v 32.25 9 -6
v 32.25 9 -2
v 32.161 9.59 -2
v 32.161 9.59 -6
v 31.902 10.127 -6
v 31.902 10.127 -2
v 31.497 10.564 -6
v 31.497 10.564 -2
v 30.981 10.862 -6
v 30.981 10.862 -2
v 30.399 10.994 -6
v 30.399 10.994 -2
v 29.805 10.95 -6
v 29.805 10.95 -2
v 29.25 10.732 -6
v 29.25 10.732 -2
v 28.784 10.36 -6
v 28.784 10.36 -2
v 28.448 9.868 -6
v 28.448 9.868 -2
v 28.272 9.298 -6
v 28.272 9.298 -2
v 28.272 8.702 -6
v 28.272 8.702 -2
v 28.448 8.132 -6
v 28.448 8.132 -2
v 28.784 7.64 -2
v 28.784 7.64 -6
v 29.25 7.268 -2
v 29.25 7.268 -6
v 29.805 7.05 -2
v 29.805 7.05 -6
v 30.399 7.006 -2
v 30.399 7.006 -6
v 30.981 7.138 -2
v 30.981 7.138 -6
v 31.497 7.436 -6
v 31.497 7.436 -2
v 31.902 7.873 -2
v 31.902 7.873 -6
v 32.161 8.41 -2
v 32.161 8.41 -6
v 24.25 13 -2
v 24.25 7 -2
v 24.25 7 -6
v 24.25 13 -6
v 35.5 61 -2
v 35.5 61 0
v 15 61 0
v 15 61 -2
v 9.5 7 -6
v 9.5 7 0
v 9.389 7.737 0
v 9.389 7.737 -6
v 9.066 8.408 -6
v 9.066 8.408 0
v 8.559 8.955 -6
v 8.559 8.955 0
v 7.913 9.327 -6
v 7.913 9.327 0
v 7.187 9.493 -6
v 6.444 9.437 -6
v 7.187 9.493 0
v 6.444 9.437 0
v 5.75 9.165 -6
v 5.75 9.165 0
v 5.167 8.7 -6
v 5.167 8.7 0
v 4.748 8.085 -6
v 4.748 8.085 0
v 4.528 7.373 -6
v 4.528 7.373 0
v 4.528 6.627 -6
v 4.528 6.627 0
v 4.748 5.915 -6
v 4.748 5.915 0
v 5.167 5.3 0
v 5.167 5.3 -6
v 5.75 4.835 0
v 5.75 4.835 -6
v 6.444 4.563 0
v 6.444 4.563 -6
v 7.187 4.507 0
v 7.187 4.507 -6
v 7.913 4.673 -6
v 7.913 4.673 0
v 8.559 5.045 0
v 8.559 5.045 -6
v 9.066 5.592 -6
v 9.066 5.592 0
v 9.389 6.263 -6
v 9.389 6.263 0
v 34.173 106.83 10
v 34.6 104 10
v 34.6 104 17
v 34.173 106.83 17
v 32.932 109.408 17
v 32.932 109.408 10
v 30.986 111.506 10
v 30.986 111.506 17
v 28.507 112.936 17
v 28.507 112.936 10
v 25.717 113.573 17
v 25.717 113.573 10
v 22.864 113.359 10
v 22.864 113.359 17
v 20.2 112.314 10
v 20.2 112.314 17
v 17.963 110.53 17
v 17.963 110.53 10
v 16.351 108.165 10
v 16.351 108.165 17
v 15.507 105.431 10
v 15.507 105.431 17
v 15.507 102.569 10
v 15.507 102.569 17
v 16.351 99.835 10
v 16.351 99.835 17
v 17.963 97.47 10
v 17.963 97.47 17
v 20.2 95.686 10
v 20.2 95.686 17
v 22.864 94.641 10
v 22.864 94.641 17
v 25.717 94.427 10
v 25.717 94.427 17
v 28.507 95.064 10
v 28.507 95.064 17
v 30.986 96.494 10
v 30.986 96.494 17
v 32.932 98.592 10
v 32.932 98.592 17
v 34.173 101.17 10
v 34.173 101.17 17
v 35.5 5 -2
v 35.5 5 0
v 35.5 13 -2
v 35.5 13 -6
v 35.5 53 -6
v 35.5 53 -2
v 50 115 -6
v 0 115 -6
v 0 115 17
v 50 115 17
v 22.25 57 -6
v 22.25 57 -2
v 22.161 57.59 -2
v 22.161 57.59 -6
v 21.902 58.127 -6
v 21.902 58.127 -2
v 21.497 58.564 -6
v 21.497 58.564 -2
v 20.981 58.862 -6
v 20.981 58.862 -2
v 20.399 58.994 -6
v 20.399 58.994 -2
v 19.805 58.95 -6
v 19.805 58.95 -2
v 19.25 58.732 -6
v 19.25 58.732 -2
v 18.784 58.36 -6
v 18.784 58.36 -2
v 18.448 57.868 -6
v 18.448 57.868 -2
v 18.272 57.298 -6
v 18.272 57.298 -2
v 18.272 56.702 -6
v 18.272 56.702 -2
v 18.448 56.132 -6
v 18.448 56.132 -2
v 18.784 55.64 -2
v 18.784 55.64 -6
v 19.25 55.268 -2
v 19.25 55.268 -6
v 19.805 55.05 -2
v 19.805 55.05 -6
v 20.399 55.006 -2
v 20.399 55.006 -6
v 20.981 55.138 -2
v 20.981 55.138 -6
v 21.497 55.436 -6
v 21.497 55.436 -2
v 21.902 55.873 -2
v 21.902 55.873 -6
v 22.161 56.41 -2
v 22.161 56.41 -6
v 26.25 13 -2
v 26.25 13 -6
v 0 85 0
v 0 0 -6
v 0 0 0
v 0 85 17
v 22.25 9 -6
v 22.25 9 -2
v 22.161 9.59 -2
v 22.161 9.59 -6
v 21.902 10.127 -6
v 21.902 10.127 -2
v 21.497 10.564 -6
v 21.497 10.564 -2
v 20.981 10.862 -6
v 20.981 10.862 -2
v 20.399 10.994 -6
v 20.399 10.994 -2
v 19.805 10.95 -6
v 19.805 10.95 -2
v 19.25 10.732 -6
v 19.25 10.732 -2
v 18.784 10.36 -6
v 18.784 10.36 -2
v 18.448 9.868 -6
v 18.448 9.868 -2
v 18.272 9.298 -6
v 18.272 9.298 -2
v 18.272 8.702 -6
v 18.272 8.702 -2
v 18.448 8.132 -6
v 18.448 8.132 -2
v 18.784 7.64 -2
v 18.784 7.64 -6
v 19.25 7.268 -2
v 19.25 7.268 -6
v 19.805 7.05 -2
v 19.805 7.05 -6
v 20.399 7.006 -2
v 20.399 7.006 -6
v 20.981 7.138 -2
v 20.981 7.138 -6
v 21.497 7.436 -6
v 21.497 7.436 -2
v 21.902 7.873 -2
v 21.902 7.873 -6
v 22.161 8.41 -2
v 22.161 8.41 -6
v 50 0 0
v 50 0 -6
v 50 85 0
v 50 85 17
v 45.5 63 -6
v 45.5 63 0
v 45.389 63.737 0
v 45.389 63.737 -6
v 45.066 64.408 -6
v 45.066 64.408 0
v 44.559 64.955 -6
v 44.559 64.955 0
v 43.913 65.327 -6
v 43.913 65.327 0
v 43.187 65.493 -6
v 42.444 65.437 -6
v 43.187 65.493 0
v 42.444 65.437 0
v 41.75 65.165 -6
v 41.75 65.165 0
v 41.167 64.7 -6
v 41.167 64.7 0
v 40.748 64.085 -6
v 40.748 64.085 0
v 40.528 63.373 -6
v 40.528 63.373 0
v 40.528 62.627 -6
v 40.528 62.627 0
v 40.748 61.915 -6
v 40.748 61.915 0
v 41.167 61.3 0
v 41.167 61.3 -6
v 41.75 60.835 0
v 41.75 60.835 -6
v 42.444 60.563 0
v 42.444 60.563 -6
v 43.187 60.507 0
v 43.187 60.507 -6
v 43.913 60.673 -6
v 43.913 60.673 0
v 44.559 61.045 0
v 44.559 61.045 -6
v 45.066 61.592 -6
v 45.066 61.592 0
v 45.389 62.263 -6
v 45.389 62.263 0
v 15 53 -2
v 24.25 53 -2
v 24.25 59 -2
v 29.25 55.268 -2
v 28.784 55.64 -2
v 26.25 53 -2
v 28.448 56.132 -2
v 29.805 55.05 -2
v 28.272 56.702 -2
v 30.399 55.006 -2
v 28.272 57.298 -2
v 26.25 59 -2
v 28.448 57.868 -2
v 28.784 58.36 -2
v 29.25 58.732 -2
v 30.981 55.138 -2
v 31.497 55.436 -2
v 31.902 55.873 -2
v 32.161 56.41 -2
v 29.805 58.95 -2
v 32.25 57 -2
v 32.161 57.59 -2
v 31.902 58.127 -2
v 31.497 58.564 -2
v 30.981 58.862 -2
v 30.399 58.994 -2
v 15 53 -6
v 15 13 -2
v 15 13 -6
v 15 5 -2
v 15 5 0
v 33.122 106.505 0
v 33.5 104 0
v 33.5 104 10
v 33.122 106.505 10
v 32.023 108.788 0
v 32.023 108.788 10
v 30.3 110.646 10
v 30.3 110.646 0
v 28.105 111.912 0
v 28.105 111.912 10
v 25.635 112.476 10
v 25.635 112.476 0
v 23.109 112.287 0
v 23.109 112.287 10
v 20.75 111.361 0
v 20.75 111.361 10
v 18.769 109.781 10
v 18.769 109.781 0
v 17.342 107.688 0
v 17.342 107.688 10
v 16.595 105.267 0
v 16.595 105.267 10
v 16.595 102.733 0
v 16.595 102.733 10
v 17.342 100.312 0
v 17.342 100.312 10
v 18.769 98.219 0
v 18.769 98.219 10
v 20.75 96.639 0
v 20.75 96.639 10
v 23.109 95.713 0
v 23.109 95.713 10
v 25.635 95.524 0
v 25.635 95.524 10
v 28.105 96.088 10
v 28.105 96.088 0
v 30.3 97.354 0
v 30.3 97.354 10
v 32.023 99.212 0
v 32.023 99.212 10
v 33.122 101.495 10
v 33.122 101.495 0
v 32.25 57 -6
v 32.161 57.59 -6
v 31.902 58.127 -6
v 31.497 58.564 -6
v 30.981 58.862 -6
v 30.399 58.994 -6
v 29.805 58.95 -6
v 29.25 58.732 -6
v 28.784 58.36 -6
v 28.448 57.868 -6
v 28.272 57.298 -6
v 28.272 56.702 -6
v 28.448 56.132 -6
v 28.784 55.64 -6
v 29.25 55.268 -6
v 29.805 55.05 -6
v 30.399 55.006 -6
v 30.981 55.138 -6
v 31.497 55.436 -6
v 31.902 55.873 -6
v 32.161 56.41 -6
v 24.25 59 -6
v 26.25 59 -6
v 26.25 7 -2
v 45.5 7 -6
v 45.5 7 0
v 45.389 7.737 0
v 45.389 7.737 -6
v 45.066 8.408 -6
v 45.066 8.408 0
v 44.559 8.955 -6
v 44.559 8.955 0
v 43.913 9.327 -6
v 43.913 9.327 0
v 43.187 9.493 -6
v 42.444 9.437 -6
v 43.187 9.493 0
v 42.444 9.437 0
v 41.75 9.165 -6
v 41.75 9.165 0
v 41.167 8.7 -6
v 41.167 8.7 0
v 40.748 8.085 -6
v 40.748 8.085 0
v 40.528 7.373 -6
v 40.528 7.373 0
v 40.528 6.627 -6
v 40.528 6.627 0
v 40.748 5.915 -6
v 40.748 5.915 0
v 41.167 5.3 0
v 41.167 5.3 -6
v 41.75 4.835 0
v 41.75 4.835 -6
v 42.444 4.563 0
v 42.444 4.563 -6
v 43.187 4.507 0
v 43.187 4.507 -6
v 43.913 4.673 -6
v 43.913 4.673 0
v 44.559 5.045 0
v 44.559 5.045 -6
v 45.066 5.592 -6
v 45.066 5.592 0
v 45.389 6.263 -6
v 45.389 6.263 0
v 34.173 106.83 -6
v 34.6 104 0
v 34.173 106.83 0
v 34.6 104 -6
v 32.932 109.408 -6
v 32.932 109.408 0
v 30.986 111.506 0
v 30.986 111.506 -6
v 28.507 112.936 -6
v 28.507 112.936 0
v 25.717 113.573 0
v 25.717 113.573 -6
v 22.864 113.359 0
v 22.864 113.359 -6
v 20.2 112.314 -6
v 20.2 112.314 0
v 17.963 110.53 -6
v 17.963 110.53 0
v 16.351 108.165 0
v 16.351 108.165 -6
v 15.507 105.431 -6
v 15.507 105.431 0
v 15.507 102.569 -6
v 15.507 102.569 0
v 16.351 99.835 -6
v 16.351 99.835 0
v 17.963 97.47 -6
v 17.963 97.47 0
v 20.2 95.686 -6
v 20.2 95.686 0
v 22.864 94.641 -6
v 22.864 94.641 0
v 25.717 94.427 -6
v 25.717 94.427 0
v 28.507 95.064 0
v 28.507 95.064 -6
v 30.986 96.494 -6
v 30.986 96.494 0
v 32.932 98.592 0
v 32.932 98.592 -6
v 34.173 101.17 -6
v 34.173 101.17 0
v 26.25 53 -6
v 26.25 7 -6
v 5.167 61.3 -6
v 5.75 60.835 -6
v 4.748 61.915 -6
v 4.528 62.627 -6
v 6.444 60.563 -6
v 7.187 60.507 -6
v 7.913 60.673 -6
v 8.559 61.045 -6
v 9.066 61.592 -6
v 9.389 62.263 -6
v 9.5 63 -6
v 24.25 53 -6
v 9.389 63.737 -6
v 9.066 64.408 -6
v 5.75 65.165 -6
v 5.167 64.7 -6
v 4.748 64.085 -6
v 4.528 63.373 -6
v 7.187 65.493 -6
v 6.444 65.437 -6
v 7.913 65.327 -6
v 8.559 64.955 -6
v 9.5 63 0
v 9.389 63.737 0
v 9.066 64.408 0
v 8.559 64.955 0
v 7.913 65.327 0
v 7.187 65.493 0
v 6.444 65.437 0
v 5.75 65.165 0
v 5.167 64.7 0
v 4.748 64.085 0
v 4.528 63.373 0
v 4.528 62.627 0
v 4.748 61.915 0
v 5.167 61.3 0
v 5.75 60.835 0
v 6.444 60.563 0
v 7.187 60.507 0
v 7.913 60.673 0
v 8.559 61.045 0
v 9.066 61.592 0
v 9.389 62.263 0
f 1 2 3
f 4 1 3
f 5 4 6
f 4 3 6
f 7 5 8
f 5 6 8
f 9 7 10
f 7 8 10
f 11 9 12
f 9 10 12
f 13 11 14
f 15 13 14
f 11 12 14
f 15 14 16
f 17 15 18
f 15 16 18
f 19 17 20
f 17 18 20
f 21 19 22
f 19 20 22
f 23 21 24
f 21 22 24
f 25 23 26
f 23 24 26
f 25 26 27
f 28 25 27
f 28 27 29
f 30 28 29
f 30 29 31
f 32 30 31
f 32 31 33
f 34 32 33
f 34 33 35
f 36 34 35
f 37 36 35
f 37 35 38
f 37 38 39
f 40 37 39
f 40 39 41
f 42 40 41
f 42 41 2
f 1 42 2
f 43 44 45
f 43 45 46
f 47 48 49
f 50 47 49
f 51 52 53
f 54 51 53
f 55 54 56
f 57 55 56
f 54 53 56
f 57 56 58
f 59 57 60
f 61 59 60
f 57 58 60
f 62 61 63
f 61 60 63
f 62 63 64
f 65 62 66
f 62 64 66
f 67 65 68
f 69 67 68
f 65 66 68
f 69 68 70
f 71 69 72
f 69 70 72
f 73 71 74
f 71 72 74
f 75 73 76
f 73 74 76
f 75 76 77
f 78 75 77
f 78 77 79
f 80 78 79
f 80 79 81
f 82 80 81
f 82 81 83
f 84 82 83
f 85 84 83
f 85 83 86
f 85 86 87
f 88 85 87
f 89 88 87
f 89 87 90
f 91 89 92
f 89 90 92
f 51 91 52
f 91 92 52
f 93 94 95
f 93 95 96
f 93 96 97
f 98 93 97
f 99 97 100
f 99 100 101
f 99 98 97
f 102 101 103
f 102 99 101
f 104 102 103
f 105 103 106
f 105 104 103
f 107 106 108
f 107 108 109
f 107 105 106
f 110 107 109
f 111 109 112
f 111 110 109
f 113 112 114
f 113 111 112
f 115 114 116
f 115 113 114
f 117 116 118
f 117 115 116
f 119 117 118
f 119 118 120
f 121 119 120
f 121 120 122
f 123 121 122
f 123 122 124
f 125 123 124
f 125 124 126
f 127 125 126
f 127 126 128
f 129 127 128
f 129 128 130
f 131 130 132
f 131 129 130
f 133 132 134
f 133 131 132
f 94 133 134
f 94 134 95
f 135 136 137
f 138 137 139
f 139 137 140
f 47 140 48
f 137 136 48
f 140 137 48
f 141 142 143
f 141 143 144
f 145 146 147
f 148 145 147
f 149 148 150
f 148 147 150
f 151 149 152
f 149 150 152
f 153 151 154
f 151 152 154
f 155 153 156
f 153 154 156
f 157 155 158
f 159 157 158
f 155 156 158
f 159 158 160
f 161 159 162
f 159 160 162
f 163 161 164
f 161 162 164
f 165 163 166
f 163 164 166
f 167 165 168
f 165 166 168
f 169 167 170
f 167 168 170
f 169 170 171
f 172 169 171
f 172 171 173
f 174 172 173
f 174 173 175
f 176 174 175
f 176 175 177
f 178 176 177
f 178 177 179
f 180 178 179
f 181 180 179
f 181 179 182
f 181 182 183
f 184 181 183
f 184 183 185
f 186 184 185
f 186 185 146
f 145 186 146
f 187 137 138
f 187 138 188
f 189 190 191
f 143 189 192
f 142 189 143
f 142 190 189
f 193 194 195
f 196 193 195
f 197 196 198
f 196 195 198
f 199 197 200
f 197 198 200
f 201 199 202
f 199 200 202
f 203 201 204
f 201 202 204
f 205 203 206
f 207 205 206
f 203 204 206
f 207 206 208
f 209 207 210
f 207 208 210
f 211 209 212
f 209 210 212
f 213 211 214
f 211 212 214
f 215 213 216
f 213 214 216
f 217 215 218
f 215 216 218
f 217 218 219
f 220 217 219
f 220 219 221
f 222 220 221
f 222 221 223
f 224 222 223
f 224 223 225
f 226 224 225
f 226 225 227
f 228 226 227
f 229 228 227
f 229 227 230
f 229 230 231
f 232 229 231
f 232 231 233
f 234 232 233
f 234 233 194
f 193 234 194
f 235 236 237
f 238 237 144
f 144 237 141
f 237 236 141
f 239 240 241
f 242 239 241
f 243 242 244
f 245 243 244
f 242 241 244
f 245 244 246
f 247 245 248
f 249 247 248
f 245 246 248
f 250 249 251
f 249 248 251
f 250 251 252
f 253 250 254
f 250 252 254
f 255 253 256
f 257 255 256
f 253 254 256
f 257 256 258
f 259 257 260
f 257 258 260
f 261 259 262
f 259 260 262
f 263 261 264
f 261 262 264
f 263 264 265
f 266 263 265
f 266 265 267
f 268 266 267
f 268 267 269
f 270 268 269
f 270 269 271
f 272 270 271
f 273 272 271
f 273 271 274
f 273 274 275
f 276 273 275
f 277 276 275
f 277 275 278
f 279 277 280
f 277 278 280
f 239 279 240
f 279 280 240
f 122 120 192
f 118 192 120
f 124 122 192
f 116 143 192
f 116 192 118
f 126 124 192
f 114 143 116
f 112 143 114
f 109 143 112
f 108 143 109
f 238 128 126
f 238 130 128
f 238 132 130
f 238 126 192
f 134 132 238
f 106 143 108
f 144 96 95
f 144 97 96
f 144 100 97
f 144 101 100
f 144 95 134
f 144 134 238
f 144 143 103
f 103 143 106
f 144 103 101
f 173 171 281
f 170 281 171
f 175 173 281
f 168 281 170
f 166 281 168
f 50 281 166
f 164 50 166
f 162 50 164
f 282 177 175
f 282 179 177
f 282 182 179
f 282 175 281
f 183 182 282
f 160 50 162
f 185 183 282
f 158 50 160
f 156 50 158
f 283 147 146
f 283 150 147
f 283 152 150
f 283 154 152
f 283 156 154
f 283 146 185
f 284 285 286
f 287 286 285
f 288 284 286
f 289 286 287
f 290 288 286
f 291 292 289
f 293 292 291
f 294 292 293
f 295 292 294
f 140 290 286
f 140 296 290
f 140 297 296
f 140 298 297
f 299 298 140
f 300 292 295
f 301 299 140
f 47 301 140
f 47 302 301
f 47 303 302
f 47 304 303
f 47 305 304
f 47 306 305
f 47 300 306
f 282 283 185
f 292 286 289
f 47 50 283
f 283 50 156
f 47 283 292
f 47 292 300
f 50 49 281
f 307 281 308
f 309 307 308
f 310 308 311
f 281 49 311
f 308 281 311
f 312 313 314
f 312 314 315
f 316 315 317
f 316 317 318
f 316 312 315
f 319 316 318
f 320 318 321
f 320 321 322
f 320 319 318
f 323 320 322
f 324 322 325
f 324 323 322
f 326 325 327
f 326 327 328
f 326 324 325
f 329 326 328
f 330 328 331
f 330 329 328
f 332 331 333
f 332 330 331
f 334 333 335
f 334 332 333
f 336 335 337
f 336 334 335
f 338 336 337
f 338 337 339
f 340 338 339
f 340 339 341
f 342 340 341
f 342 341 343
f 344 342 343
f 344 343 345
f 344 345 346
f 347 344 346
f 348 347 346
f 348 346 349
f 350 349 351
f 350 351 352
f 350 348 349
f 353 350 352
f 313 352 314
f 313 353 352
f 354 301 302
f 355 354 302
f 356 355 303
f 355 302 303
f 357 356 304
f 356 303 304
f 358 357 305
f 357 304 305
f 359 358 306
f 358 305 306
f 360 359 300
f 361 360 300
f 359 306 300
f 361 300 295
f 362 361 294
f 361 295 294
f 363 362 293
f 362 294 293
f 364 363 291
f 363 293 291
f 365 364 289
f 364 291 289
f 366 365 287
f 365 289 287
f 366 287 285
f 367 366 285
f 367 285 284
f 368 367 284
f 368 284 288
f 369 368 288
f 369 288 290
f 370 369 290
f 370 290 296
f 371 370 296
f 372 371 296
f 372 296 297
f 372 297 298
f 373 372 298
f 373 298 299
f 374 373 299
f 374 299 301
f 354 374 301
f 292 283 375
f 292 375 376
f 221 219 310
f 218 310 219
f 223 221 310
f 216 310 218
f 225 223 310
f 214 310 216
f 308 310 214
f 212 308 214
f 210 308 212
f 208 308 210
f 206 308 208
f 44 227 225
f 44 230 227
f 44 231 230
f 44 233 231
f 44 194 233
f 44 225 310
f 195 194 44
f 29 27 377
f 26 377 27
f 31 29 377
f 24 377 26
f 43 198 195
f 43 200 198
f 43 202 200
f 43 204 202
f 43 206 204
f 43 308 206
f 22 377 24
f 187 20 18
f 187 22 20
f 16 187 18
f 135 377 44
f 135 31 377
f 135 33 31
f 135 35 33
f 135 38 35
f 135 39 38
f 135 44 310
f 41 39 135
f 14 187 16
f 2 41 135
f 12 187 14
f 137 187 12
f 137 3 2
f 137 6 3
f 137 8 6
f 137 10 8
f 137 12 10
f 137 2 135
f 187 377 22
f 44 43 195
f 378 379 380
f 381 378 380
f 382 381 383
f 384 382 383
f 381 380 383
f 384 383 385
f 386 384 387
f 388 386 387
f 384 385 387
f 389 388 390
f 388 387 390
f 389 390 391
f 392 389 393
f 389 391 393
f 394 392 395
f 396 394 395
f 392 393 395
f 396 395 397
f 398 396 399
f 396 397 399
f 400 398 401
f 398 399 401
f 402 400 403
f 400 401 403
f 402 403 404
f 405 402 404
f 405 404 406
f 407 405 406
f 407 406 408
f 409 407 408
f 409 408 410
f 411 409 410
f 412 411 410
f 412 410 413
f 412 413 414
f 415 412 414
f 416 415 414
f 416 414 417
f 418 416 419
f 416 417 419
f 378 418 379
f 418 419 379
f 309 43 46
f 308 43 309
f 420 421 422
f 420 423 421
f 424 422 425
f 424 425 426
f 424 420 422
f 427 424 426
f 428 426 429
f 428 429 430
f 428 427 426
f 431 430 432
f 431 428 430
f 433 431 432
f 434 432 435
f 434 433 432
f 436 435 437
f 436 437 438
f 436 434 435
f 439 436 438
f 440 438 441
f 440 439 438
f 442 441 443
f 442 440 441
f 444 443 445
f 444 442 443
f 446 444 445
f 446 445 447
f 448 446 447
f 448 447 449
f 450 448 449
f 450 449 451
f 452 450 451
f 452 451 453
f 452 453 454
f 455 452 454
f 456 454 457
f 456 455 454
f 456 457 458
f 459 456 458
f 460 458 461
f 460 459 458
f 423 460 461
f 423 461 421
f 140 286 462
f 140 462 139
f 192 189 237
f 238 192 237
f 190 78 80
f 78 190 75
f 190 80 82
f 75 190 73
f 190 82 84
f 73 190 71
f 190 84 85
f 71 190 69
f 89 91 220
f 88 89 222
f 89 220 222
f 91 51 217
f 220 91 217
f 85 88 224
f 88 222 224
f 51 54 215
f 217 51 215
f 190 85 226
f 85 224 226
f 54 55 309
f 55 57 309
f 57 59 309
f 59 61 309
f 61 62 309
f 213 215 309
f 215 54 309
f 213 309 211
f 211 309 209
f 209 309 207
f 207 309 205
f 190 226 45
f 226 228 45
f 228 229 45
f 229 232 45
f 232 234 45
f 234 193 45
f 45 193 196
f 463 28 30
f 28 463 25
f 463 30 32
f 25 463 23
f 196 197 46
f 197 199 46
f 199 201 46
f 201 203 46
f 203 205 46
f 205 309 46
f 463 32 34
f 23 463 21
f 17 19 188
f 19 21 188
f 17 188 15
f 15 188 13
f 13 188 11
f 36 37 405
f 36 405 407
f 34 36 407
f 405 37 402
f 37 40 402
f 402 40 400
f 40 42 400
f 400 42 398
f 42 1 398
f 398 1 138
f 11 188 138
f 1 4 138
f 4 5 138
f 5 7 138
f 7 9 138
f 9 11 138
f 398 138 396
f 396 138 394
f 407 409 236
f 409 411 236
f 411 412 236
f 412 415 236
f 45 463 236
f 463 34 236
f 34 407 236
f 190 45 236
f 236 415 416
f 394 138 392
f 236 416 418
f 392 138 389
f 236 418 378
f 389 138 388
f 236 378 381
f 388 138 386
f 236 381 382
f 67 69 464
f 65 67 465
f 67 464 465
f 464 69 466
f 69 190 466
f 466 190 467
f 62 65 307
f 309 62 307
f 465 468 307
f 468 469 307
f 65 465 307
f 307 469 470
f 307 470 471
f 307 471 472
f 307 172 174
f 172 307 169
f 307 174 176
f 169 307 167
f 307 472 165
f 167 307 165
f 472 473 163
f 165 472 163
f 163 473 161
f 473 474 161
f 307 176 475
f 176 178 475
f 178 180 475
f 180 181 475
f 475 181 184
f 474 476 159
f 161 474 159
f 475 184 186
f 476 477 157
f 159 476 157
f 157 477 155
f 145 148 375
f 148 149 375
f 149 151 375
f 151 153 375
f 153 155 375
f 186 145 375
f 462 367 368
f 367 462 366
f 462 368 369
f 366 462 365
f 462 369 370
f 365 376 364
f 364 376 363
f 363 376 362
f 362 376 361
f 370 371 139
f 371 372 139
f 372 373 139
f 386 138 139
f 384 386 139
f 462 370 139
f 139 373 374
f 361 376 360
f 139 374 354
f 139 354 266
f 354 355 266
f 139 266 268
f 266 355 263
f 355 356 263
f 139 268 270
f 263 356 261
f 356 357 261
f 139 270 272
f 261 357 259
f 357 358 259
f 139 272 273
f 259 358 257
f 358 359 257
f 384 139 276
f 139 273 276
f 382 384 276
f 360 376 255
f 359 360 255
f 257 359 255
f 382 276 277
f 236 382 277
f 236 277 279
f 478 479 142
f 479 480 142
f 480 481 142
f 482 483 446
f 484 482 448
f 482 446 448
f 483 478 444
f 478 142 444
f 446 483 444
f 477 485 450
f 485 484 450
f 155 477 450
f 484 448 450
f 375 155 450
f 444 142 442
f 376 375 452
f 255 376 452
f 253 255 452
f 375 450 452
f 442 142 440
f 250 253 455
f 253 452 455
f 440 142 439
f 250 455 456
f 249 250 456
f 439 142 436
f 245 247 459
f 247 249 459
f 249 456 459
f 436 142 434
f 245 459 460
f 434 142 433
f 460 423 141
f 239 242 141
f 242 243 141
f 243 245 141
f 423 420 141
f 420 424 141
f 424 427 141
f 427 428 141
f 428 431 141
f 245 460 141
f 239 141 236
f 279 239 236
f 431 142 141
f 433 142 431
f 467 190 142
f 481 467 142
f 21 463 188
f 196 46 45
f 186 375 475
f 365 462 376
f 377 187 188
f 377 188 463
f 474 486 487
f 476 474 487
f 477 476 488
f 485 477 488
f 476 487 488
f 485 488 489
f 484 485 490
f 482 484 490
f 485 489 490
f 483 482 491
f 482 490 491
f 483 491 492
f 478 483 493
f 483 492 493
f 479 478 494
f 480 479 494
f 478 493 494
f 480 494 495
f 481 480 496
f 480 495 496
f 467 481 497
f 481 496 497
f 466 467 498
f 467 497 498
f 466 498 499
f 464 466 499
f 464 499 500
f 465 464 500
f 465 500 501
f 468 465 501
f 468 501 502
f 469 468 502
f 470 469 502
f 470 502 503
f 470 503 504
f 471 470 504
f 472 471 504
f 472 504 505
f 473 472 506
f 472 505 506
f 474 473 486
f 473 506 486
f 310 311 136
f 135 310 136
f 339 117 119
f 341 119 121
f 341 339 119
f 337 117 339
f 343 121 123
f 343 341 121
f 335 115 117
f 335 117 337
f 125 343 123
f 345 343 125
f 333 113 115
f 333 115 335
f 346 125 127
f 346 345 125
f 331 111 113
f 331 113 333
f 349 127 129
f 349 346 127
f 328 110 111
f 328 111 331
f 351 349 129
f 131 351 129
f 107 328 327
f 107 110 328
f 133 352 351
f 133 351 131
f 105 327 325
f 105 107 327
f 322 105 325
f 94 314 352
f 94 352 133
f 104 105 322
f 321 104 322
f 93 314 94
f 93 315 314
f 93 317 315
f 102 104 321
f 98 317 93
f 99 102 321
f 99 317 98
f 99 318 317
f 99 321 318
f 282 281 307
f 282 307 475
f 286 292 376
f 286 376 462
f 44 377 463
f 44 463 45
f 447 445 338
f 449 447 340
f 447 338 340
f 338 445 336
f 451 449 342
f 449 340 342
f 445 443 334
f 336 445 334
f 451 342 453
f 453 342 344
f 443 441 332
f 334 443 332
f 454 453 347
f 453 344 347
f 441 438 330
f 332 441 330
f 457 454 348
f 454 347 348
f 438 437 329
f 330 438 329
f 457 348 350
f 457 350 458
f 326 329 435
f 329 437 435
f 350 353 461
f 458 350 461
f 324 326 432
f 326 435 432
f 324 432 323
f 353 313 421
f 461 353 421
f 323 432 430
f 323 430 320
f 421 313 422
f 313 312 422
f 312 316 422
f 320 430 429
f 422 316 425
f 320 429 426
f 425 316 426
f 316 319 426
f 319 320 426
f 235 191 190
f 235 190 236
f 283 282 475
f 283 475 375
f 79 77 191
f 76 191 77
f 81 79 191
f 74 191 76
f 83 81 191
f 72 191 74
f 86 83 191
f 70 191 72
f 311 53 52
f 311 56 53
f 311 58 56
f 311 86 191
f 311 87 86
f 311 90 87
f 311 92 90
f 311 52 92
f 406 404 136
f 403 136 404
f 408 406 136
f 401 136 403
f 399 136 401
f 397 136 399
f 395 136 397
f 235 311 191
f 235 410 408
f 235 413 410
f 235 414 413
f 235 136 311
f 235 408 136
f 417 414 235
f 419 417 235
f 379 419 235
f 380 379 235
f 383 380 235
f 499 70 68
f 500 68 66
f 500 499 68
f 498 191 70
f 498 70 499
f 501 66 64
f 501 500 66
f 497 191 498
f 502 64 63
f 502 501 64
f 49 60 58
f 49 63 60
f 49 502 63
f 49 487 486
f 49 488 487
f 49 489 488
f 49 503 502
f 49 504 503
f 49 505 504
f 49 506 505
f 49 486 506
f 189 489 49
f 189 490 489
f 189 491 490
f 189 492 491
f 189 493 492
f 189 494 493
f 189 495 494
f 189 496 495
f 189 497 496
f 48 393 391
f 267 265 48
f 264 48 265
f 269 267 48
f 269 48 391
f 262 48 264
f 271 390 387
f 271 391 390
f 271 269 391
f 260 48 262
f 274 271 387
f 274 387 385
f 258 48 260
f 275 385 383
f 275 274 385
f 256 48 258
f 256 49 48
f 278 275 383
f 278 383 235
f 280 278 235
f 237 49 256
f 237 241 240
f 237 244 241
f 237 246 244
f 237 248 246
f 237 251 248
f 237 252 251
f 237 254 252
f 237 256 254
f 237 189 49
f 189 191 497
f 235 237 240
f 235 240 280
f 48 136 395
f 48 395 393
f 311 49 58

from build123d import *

# Parameters (mm, degrees)
F0_W     = 50
F0_H     = 85
F0_R     = 2.5
F0_R_2   = 2
F0_H_2   = 30
F0_R_3   = 9.6
F1_DEPTH = 6
F2_DEPTH = 2
F3_DEPTH = 17
F0_R_4   = 8.5
F4_DEPTH = 10


with BuildPart() as f1:
    # F0 (on Top) → F1 (new body)
    with BuildSketch(Plane.XY):
        with Locations((25, 42.5)):
            Rectangle(F0_W, F0_H)
        with Locations((7, 7)):
            Circle(F0_R, mode=Mode.SUBTRACT)
        with Locations((43, 7)):
            Circle(F0_R, mode=Mode.SUBTRACT)
        Polygon((35.5, 5), (15, 5), (15, 13), (15, 53), (15, 61), (35.5, 61), (35.5, 53), (35.5, 13), align=None, mode=Mode.SUBTRACT)
        with Locations((7, 63)):
            Circle(F0_R, mode=Mode.SUBTRACT)
        with Locations((43, 63)):
            Circle(F0_R, mode=Mode.SUBTRACT)
        Polygon((15, 61), (15, 53), (24.25, 53), (24.25, 59), (26.25, 59), (26.25, 53), (35.5, 53), (35.5, 61), align=None)
        with Locations((20.25, 57)):
            Circle(F0_R_2, mode=Mode.SUBTRACT)
        with Locations((30.25, 57)):
            Circle(F0_R_2, mode=Mode.SUBTRACT)
        Polygon((15, 13), (15, 5), (35.5, 5), (35.5, 13), (26.25, 13), (26.25, 7), (24.25, 7), (24.25, 13), align=None)
        with Locations((20.25, 9)):
            Circle(F0_R_2, mode=Mode.SUBTRACT)
        with Locations((30.25, 9)):
            Circle(F0_R_2, mode=Mode.SUBTRACT)
        with Locations((25, 100)):
            Rectangle(F0_W, F0_H_2)
        with Locations((25, 104)):
            Circle(F0_R_3, mode=Mode.SUBTRACT)
    extrude(amount=-F1_DEPTH)

    # F0 (on Top) → F2 (cut)
    with BuildSketch(Plane.XY):
        Polygon((15, 61), (15, 53), (24.25, 53), (24.25, 59), (26.25, 59), (26.25, 53), (35.5, 53), (35.5, 61), align=None)
        with Locations((20.25, 57)):
            Circle(F0_R_2, mode=Mode.SUBTRACT)
        with Locations((30.25, 57)):
            Circle(F0_R_2, mode=Mode.SUBTRACT)
        Polygon((15, 13), (15, 5), (35.5, 5), (35.5, 13), (26.25, 13), (26.25, 7), (24.25, 7), (24.25, 13), align=None)
        with Locations((20.25, 9)):
            Circle(F0_R_2, mode=Mode.SUBTRACT)
        with Locations((30.25, 9)):
            Circle(F0_R_2, mode=Mode.SUBTRACT)
    extrude(amount=-F2_DEPTH, mode=Mode.SUBTRACT)

    # F0 (on Top) → F3 (join)
    with BuildSketch(Plane.XY):
        with Locations((25, 100)):
            Rectangle(F0_W, F0_H_2)
        with Locations((25, 104)):
            Circle(F0_R_3, mode=Mode.SUBTRACT)
    extrude(amount=F3_DEPTH)

    # F0 (on Top) → F4 (join)
    with BuildSketch(Plane.XY):
        with Locations((25, 104)):
            Circle(F0_R_3)
        with Locations((25, 104)):
            Circle(F0_R_4, mode=Mode.SUBTRACT)
    extrude(amount=F4_DEPTH)


solid = f1.part
